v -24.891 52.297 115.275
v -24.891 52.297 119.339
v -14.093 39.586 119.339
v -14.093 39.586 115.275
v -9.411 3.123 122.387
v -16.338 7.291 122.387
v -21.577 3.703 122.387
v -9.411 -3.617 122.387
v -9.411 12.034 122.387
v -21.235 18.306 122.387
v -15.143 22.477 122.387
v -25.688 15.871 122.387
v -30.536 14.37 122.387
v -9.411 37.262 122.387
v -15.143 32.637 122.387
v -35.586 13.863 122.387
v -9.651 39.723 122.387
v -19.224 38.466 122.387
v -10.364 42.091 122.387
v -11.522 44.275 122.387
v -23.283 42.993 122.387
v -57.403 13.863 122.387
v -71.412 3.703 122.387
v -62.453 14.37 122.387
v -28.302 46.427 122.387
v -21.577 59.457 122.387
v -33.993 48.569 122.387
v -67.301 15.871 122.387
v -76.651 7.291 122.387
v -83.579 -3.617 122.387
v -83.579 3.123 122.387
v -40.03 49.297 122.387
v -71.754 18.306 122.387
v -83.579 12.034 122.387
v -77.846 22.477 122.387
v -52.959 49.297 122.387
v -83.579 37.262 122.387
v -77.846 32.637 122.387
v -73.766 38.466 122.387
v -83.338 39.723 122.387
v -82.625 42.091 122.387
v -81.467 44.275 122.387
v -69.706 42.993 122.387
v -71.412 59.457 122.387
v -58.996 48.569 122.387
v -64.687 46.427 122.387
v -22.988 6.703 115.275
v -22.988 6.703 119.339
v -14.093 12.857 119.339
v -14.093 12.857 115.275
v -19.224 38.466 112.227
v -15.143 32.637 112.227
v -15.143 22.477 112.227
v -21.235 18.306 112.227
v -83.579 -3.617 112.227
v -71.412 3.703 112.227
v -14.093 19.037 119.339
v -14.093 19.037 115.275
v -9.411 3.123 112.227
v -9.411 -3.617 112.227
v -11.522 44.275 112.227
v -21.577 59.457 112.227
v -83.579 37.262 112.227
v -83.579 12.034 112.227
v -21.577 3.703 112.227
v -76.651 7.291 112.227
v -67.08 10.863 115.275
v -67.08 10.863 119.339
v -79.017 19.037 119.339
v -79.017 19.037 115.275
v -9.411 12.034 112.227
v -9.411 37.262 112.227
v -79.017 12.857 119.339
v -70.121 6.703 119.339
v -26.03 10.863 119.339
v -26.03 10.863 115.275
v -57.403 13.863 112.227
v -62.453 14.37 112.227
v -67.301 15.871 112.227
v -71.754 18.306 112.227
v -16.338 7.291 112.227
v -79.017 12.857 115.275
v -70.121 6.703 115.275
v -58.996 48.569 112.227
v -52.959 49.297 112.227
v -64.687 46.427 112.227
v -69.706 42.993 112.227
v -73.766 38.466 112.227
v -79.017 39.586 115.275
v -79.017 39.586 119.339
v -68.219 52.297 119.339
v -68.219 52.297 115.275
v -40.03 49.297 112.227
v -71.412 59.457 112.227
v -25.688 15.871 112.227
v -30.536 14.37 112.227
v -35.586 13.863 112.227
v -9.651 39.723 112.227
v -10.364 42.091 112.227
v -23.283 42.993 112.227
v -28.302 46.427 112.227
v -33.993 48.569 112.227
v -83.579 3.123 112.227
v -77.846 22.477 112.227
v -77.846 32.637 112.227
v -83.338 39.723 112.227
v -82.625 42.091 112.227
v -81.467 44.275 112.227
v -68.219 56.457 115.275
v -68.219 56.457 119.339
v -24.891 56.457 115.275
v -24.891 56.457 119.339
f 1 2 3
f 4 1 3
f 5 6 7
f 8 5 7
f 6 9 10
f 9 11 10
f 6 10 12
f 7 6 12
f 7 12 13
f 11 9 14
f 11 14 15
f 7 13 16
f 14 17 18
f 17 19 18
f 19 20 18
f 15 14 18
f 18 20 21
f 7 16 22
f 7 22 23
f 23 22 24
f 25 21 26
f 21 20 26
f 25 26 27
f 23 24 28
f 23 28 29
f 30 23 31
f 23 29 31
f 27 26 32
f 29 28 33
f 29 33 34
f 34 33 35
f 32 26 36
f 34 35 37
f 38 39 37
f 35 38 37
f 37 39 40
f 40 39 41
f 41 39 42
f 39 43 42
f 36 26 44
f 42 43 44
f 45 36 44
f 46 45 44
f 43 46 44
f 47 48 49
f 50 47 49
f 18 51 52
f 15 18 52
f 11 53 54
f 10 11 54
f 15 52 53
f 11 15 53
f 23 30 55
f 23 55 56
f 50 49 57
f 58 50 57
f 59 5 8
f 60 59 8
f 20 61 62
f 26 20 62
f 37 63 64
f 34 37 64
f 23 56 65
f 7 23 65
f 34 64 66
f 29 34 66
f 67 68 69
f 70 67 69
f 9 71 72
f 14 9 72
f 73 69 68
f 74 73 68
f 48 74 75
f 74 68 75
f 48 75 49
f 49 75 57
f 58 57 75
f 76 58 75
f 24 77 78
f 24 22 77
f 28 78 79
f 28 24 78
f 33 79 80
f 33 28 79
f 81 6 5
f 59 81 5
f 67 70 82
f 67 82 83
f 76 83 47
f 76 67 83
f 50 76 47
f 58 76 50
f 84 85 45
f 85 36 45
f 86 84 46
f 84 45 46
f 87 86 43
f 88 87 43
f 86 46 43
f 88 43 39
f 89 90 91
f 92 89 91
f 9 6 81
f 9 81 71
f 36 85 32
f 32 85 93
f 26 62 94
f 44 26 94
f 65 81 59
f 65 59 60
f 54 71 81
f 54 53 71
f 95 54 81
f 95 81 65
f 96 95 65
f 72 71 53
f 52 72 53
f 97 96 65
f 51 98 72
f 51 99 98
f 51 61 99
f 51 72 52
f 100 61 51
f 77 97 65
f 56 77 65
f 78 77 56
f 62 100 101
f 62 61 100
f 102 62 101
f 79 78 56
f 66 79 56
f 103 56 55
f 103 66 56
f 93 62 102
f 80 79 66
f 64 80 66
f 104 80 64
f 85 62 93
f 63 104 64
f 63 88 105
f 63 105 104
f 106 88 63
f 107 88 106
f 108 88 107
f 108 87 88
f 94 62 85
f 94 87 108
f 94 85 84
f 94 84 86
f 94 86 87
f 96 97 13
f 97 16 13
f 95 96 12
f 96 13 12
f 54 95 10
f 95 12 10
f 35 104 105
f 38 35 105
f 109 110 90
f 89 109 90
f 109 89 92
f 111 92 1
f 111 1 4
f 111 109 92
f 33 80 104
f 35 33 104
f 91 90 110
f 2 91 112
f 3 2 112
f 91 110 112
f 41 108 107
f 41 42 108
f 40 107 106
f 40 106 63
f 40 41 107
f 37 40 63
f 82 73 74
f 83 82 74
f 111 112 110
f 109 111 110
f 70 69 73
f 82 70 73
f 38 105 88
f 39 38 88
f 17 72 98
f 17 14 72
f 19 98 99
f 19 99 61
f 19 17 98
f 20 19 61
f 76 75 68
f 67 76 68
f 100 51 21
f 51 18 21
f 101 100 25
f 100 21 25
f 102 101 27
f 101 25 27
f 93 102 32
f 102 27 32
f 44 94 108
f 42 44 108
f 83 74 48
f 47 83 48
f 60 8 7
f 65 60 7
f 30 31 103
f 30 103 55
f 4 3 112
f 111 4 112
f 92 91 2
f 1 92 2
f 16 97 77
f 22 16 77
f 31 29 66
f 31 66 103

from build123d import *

# Parameters (mm, degrees)
BOSS_EXTRUDE1_DEPTH      = 5.08
BOSS_EXTRUDE1_DEPTH_BACK = 5.08
BOSS_EXTRUDE1_START      = -15.3035
FILLET1_R                = 12.7
FILLET2_R                = 12.7
FILLET3_R                = 25.4
BOSS_EXTRUDE2_DEPTH      = 10.16
CUT_EXTRUDE1_DEPTH       = 2.032
CUT_EXTRUDE1_DEPTH_BACK  = 2.032


with BuildPart() as part:
    # Sketch1 → Boss-Extrude1 (new, two sides: drawn at the far end of the back side and taken through both)
    with BuildSketch(Plane.XY.offset(132.610741806).offset(BOSS_EXTRUDE1_START - BOSS_EXTRUDE1_DEPTH_BACK)):
        Polygon((-83.578638746, 26.563044496), (-83.578638746, 12.034244496), (-71.412108995, 3.703044496), (-21.577168497, 3.703044496), (-9.410638746, 12.034244496), (-9.410638746, 26.563044496), (-9.410638746, 41.086800568), (-21.577168497, 59.456669294), (-71.412108995, 59.456669294), (-83.578638746, 41.086800568), align=None)
        Polygon((-65.266559293, 13.863044496), (-77.846462947, 22.47730801), (-77.846462947, 32.63730801), (-66.181452594, 49.296669294), (-26.807824897, 49.296669294), (-15.142814545, 32.63730801), (-15.142814545, 22.47730801), (-27.722718198, 13.863044496), align=None, mode=Mode.SUBTRACT)
    extrude(amount=BOSS_EXTRUDE1_DEPTH + BOSS_EXTRUDE1_DEPTH_BACK)

    # Fillet1
    fillet1_edges = [part.edges().sort_by_distance(p)[0] for p in [
        (-9.410638746, 41.086800568, 117.307241806),
    ]]
    fillet(fillet1_edges, radius=FILLET1_R)

    # Fillet2
    fillet2_edges = [part.edges().sort_by_distance(p)[0] for p in [
        (-83.578638746, 41.086800568, 117.307241806),
    ]]
    fillet(fillet2_edges, radius=FILLET2_R)

    # Fillet3
    fillet3_edges = [part.edges().sort_by_distance(p)[0] for p in [
        (-65.266559293, 13.863044496, 117.307241806),
        (-27.722718198, 13.863044496, 117.307241806),
        (-26.807824897, 49.296669294, 117.307241806),
        (-66.181452594, 49.296669294, 117.307241806),
    ]]
    fillet(fillet3_edges, radius=FILLET3_R)

    # Sketch2 → Boss-Extrude2 (add)
    with BuildSketch(Plane.XY.offset(122.387241806)):
        Polygon((-83.578638746, -3.617199432), (-71.412108995, 3.703044496), (-76.651458613, 7.290761818), (-83.578638746, 3.122880808), align=None)
    boss_extrude2 = extrude(amount=-BOSS_EXTRUDE2_DEPTH)

    # Mirror1: Boss-Extrude2 across plane
    add(boss_extrude2.mirror(Plane(origin=(-46.494638746, 0, 0), x_dir=(0, 0, 1), z_dir=(1, 0, 0))))

    # Sketch3 → Cut-Extrude1 (cut, two sides: drawn at the far end of the back side and taken through both)
    with BuildSketch(Plane(origin=(0, 0, 117.307241806), x_dir=(-1, 0, 0), z_dir=(0, 0, -1)).offset(-CUT_EXTRUDE1_DEPTH_BACK)):
        Polygon((24.891011245, 56.456669294), (68.21883105, 56.456669294), (79.016596447, 39.586472788), (68.21883105, 52.296669294), (24.891011245, 52.296669294), (14.093245849, 39.586472788), align=None)
        Polygon((79.016596447, 19.036634436), (79.016596447, 12.857149387), (70.121493391, 6.703044496), (22.988348904, 6.703044496), (14.093245849, 12.857149387), (14.093245849, 19.036634436), (26.029608579, 10.863044496), (67.080233717, 10.863044496), align=None)
    extrude(amount=CUT_EXTRUDE1_DEPTH + CUT_EXTRUDE1_DEPTH_BACK, mode=Mode.SUBTRACT)


solid = part.part
